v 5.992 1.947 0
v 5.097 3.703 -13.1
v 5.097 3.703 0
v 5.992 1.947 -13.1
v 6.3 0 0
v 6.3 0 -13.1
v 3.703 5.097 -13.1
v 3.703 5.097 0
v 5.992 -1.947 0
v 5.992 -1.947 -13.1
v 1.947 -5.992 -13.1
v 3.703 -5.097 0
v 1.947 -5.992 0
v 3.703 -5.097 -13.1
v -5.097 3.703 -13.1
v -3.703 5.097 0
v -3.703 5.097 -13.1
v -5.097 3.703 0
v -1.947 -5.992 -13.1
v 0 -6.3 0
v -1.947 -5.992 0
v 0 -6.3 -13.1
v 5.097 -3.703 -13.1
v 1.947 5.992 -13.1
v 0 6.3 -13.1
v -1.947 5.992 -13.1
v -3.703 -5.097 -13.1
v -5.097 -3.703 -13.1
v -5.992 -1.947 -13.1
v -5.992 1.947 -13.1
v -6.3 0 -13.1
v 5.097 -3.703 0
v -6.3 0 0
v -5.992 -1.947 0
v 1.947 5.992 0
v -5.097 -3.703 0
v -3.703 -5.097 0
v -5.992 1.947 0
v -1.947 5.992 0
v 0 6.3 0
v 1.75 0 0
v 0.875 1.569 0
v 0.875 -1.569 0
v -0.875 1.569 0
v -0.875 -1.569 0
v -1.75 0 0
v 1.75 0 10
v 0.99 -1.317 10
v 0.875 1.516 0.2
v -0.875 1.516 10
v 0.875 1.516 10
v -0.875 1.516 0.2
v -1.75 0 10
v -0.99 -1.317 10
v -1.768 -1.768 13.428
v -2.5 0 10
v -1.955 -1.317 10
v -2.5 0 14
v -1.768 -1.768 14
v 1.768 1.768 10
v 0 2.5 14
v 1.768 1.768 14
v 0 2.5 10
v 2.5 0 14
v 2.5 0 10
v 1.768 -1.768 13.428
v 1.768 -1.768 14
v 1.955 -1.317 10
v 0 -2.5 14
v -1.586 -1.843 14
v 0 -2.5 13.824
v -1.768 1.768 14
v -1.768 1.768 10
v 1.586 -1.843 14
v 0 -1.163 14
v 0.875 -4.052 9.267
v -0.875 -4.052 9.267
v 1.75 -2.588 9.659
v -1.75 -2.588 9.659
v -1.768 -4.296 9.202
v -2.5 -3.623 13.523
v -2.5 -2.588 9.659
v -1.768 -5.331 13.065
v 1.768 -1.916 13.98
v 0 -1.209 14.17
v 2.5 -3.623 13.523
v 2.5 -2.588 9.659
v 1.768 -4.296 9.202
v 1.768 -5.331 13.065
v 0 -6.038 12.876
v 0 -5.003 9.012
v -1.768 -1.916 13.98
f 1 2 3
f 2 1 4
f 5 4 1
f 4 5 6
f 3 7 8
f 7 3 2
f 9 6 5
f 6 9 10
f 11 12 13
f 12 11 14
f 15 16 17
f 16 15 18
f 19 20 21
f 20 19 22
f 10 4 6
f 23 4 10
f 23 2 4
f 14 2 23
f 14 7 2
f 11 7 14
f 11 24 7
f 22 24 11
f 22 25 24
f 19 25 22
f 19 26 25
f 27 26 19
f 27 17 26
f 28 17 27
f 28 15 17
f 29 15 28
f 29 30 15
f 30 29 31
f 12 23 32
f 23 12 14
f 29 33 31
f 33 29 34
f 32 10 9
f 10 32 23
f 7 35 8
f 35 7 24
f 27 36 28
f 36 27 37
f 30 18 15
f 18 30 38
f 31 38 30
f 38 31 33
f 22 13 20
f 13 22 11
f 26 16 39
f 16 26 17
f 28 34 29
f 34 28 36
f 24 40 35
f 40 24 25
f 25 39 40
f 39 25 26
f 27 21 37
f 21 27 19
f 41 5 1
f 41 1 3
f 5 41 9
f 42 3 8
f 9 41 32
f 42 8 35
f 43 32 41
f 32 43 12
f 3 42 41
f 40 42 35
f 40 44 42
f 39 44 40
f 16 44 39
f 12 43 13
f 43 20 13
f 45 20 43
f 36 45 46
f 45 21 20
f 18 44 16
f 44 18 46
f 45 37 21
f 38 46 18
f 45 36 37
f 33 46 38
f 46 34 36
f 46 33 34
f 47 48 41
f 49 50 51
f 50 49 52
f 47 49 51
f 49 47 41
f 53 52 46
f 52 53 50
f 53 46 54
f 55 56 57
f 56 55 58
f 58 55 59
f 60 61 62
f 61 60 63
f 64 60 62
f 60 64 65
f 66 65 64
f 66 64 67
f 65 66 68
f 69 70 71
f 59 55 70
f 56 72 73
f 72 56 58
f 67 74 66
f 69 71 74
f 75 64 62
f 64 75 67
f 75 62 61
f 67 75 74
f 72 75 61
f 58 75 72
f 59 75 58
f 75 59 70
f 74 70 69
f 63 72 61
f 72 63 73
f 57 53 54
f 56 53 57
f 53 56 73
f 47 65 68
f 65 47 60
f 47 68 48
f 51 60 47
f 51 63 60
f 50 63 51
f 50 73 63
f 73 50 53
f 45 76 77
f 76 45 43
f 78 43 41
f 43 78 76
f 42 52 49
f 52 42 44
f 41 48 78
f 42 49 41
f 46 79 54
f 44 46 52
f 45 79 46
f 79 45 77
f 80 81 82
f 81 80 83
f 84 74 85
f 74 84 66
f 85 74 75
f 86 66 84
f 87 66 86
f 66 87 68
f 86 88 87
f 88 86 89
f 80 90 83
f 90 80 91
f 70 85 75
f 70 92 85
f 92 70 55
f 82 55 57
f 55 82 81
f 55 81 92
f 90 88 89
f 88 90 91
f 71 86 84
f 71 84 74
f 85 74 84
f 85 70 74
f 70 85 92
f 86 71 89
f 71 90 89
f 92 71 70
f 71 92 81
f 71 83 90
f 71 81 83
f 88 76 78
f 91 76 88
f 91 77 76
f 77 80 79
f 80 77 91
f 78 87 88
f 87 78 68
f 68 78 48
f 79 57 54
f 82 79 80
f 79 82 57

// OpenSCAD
// Parameters
body_diameter_mm = 12.6; //[6.3:25.2:0.1]
body_height_mm = 13.1; //[6.55:26.2:0.1]
centered = 1; //[0:1:1]
eps_mm = 1; //[0.5:2:0.1]
face_thickness_mm = 0.6; //[0.3:2:0.1]
toggle_shaft_diameter_mm = 3.5; //[2:7:0.1]
toggle_shaft_length_mm = 12; //[6:24:0.5]
toggle_tip_diameter_mm = 5; //[3:10:0.1]
toggle_tip_height_mm = 4; //[2:10:0.1]
toggle_angle_deg = 15; //[-30:30:1]

// Toggle switch - complete geometry
module toggle() {
  // Main body
  color("DimGray") {
    translate([0, 0, (0.5 - centered) * body_height_mm])
      cylinder(r=body_diameter_mm/2, h=body_height_mm, center=true);
  }
  
  // Top face
  color("Silver") {
    translate([0, 0, (0.5 - centered) * body_height_mm + body_height_mm/2 - face_thickness_mm/2 - eps_mm])
      cylinder(r=body_diameter_mm/2, h=face_thickness_mm, center=true);
  }
  
  // Bottom face
  color("Silver") {
    translate([0, 0, (0.5 - centered) * body_height_mm - body_height_mm/2 + face_thickness_mm/2 + eps_mm])
      cylinder(r=body_diameter_mm/2, h=face_thickness_mm, center=true);
  }
  
  // Toggle shaft
  color("Black") {
    translate([0, 0, (0.5 - centered) * body_height_mm + body_height_mm/2 + toggle_shaft_length_mm/2 - eps_mm])
      cylinder(r=toggle_shaft_diameter_mm/2, h=toggle_shaft_length_mm, center=true);
  }
  
  // Toggle tip
  color("Black") {
    translate([0, 0, (0.5 - centered) * body_height_mm + body_height_mm/2 + toggle_shaft_length_mm - eps_mm + toggle_tip_height_mm/2 - eps_mm])
      cylinder(r=toggle_tip_diameter_mm/2, h=toggle_tip_height_mm, center=true);
  }
}

// Assembly
module assembly() {
  union() {
    // Main body with faces
    union() {
      toggle();
    }
    // Rotated toggle
    rotate([toggle_angle_deg, 0, 0]) {
      union() {
        // Toggle shaft and tip
        translate([0, 0, (0.5 - centered) * body_height_mm + body_height_mm/2 + toggle_shaft_length_mm/2 - eps_mm])
          cylinder(r=toggle_shaft_diameter_mm/2, h=toggle_shaft_length_mm, center=true);
        translate([0, 0, (0.5 - centered) * body_height_mm + body_height_mm/2 + toggle_shaft_length_mm - eps_mm + toggle_tip_height_mm/2 - eps_mm])
          cylinder(r=toggle_tip_diameter_mm/2, h=toggle_tip_height_mm, center=true);
      }
    }
  }
}

assembly();
